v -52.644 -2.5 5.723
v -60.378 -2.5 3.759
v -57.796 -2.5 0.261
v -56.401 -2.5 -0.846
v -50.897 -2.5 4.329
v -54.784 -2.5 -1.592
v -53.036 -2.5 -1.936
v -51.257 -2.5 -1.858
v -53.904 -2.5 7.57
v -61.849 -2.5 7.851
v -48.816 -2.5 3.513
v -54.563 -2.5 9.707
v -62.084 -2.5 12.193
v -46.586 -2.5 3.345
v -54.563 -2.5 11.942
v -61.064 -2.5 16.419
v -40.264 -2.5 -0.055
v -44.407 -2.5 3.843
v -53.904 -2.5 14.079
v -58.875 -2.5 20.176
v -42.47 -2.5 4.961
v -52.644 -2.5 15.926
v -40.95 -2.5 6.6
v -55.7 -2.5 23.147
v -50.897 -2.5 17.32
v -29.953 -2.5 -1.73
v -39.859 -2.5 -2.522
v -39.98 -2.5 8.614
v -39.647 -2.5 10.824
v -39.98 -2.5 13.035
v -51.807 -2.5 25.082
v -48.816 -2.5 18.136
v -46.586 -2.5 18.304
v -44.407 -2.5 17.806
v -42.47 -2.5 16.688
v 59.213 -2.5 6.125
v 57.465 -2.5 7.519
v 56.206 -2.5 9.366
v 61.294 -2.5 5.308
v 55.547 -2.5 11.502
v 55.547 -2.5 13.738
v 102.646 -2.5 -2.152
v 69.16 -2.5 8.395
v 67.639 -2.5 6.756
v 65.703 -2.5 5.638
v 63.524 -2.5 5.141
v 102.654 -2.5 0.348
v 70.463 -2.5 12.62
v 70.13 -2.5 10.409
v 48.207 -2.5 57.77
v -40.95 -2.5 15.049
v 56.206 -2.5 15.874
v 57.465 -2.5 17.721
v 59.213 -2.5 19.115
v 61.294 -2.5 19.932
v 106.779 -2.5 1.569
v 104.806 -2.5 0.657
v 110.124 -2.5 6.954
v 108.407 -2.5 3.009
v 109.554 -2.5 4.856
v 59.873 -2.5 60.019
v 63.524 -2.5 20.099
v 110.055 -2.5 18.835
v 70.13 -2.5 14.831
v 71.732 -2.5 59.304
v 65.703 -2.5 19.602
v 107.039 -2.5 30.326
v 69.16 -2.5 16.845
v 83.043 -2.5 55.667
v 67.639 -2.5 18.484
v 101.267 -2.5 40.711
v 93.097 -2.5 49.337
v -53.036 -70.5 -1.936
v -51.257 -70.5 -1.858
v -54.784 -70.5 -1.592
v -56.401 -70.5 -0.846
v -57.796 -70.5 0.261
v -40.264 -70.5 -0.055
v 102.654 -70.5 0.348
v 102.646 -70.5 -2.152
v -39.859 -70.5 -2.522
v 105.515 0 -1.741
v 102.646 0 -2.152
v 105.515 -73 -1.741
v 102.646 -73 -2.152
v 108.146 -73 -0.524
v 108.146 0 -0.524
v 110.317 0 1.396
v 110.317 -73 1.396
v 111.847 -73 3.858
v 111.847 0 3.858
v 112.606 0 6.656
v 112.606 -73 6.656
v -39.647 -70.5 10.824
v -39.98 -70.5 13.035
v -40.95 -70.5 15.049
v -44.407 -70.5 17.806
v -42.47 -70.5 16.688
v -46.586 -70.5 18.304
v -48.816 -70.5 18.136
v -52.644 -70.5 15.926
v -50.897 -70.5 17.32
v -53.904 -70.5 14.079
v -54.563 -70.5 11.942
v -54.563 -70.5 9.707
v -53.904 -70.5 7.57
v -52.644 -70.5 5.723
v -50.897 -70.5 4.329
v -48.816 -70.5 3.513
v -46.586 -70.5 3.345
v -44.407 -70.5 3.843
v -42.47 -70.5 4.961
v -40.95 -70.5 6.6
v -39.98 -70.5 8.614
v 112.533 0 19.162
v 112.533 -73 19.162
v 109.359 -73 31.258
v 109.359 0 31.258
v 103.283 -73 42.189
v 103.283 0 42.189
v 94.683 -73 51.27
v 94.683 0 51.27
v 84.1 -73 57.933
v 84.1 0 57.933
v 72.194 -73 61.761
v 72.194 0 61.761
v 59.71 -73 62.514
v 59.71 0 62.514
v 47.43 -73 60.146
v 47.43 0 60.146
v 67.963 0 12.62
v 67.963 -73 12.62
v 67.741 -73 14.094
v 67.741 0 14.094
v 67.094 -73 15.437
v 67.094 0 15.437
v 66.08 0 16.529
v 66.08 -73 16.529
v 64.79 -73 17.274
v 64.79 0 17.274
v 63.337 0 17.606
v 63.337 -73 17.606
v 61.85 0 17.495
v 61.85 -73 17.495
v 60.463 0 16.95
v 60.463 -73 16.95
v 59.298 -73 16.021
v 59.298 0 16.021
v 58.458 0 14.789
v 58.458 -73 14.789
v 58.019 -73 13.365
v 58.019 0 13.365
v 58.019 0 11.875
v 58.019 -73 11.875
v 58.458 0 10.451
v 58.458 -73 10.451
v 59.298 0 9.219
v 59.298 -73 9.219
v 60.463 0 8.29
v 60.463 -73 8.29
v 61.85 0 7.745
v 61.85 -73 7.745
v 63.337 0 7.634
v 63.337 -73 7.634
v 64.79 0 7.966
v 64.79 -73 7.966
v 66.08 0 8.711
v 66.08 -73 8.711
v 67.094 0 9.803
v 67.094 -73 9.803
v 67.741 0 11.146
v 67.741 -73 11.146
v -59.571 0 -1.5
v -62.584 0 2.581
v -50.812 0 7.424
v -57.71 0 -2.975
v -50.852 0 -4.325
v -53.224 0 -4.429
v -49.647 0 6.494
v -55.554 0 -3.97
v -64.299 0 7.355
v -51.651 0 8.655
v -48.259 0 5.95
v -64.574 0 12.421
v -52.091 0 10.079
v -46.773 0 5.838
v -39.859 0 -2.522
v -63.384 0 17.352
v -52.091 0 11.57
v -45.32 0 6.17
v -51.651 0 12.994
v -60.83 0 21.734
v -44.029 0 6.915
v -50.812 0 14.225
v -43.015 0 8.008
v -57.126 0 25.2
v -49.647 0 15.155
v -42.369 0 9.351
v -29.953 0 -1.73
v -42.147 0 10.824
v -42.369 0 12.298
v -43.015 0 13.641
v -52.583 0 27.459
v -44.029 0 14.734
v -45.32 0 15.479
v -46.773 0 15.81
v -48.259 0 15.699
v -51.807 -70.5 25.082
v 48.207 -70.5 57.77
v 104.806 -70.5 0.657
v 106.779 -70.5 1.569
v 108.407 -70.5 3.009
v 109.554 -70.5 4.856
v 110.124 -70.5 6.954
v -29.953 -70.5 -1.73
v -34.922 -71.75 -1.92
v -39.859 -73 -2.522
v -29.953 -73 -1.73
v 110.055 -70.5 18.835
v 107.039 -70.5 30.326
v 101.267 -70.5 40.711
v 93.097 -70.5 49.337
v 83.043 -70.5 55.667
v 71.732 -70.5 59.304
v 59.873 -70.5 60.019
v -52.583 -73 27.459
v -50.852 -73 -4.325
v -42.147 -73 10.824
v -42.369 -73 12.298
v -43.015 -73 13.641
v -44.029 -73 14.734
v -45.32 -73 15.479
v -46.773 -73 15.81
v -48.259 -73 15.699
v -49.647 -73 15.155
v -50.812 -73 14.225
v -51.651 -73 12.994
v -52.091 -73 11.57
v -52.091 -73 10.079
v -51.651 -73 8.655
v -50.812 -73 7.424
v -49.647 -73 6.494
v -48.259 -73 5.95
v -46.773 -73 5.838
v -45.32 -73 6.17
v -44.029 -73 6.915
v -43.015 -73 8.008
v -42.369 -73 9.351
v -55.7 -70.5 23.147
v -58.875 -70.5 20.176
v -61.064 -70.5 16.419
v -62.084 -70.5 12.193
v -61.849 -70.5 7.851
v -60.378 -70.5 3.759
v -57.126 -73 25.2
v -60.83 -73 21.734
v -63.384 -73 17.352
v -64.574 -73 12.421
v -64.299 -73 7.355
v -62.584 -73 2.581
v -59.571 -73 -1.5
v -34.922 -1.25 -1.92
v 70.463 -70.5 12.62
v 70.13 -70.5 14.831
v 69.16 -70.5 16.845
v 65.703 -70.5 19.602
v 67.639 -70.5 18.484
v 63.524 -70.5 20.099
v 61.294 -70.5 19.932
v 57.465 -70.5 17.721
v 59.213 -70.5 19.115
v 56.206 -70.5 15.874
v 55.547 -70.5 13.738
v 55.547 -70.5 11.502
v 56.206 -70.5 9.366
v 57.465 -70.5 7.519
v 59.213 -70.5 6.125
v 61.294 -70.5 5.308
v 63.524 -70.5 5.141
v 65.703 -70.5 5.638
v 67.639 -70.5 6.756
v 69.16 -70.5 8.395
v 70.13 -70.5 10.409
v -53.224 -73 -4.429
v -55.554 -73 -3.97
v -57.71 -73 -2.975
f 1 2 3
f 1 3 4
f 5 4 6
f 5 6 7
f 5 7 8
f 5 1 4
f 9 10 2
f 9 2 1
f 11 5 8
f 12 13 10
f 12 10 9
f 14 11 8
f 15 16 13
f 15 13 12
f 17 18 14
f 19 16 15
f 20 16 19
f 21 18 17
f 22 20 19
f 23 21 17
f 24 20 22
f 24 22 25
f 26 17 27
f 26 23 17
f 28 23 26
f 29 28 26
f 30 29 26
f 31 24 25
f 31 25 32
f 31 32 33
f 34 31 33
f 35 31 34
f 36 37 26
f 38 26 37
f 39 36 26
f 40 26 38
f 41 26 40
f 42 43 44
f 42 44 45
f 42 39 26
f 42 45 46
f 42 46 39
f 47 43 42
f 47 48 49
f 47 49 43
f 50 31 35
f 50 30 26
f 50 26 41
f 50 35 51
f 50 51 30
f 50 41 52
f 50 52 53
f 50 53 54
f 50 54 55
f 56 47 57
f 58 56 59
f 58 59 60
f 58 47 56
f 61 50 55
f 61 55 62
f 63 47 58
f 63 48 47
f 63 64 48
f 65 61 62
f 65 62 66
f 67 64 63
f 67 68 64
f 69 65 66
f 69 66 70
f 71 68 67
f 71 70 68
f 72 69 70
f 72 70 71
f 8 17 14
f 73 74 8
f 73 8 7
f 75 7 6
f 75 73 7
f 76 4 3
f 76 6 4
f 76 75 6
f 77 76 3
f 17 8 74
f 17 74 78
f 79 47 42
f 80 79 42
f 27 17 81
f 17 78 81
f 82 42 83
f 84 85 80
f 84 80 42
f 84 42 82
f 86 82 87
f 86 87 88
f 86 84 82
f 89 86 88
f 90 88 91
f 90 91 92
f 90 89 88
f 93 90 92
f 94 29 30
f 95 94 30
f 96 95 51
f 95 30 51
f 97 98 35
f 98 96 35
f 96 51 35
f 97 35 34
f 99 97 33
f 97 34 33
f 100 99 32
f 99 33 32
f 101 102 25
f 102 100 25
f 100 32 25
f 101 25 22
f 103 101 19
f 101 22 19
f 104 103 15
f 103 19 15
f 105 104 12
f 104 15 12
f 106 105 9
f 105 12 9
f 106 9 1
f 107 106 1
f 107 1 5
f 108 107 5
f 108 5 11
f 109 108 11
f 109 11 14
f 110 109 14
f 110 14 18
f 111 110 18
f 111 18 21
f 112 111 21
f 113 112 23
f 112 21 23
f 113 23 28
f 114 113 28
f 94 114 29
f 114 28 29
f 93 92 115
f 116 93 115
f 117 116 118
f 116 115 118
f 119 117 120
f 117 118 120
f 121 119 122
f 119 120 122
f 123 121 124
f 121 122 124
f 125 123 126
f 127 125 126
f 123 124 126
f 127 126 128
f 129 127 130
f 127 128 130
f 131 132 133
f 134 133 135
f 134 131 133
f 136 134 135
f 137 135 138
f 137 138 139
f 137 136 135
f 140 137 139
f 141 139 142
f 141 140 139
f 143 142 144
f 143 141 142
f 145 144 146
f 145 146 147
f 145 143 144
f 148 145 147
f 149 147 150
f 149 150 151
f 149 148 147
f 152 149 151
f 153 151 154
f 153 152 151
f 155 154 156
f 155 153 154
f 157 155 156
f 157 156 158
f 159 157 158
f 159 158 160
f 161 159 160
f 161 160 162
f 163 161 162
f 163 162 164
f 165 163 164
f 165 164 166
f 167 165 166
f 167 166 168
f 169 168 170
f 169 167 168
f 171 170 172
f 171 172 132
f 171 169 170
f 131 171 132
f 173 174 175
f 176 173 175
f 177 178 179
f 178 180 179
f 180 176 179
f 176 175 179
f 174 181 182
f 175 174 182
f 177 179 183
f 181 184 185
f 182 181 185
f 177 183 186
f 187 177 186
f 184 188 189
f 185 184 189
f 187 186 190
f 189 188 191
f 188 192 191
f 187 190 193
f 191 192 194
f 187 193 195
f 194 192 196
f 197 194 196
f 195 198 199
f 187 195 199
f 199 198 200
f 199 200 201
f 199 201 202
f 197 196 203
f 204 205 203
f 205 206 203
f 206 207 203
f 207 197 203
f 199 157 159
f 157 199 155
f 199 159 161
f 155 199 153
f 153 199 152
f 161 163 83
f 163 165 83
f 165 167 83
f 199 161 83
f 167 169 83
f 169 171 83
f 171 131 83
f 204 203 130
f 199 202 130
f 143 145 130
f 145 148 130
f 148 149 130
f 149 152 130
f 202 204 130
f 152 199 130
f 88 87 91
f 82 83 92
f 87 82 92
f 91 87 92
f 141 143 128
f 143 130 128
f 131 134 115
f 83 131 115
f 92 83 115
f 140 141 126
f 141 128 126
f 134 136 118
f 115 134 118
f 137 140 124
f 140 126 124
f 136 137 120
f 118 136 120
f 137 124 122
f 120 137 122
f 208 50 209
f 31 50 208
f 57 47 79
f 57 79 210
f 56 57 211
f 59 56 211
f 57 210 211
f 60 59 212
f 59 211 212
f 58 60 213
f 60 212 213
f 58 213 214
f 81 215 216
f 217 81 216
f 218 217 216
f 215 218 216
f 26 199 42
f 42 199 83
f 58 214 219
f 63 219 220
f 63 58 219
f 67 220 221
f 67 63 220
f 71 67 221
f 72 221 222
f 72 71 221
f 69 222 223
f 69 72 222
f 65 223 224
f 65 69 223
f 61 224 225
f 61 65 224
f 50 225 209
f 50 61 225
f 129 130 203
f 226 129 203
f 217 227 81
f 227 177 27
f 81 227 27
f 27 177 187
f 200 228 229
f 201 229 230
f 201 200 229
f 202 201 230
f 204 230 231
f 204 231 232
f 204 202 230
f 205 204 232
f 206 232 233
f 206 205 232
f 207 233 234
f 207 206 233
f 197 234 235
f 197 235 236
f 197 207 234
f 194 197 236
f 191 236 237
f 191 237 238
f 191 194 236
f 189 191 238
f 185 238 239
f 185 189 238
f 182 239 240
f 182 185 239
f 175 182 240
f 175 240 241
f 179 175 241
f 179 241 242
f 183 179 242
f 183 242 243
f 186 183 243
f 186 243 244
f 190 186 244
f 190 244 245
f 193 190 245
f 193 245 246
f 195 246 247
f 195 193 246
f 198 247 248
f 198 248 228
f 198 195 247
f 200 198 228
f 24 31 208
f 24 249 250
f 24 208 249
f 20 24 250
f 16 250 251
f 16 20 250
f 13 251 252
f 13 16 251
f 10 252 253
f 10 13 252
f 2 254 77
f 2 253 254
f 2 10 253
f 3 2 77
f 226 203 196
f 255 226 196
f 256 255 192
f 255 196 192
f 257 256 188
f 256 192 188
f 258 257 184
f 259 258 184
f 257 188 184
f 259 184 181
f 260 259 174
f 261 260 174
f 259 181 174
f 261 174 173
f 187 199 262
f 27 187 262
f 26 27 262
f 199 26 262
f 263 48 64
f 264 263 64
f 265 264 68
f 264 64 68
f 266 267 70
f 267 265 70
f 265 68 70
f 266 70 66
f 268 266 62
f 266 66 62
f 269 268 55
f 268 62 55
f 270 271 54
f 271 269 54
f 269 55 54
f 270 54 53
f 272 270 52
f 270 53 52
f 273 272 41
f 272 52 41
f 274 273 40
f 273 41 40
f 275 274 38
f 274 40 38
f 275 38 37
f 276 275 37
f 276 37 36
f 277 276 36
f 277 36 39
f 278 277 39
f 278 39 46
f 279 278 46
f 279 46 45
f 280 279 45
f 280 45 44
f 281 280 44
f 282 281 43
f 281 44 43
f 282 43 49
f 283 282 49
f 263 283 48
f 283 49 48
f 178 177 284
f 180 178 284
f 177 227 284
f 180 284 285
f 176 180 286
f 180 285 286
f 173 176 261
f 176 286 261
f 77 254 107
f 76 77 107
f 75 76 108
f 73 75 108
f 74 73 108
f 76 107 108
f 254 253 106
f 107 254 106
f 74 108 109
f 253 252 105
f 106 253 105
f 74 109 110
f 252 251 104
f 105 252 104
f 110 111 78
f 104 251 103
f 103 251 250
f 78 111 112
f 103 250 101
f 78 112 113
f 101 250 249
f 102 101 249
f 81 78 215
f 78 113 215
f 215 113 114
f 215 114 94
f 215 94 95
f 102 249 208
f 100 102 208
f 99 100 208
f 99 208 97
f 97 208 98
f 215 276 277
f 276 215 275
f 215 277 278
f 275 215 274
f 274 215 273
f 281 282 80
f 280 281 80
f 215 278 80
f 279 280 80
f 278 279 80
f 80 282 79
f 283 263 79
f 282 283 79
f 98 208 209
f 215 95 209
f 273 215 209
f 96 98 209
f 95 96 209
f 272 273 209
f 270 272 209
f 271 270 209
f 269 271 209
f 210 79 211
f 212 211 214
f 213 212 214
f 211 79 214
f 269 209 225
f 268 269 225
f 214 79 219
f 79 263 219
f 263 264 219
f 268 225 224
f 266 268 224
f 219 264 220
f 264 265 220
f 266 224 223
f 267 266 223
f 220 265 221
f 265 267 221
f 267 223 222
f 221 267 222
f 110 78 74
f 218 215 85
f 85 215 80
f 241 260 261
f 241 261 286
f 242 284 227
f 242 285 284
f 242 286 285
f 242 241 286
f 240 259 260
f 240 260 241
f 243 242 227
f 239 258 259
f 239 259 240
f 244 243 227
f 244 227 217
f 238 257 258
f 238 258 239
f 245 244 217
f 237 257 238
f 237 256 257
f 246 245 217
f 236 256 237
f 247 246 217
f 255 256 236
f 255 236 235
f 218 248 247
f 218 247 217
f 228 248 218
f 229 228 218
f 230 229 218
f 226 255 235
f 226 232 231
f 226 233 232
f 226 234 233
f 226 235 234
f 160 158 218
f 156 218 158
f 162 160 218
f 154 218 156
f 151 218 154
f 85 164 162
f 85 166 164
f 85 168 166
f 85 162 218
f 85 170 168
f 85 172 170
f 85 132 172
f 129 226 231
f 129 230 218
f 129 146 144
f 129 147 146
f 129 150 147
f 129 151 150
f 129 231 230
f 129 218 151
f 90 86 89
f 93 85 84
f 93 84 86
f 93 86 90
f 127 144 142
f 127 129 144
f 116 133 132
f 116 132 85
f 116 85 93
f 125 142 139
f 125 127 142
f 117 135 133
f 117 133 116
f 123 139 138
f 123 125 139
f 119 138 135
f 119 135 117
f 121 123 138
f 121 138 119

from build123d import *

# Parameters (mm, degrees)
F0_R        = 5
F1_DEPTH    = 73
F2_T1_DEPTH = 73
F3_R        = 10
F4_T        = 2.5


# Not quite as in the source:
# - a fillet or chamfer that OpenCascade refuses, or shapes differently, is made with other operations: its cross-section is extruded or revolved along the edge and cut away or added
# - a shell that OpenCascade refuses in one call is made with other operations: the cavity is built on its own and cut out


with BuildPart() as f1:
    # F0 (on Front) → F1 (new body)
    with BuildSketch(Plane.XZ):
        with BuildLine():
            Line((105.4664104798, -2.1604888337), (110.723299262, -2.1771916507))
            ThreePointArc((110.723299262, -2.1771916507), (98.0443002081, 48.2472921113), (47.4300209604, 60.1460448152))
            Line((47.4300209604, 60.1460448152), (-52.5831548864, 27.4585928761))
            ThreePointArc((-52.5831548864, 27.4585928761), (-64.6091493054, 11.9687796957), (-54.7073812284, -4.9579401011))
            Line((-54.7073812284, -4.9579401011), (-34.93893119, -1.7143761565))
            Line((-34.93893119, -1.7143761565), (20.3665836392, -1.8900994658))
            ThreePointArc((20.3665836392, -1.8900994658), (55.6091219512, 57.015037844), (107.9630298197, 12.6199926356))
            ThreePointArc((107.9630298197, 12.6199926356), (107.3344853384, 5.1250653412), (105.4664104798, -2.1604888337))
        make_face()
        with Locations((-47.1466017857, 10.8244746133)):
            Circle(F0_R, mode=Mode.SUBTRACT)
        with BuildLine():
            Line((20.3665836392, -1.8900994658), (105.4664104798, -2.1604888337))
            ThreePointArc((105.4664104798, -2.1604888337), (107.3344853384, 5.1250653412), (107.9630298197, 12.6199926356))
            ThreePointArc((107.9630298197, 12.6199926356), (55.6091219512, 57.015037844), (20.3665836392, -1.8900994658))
        make_face()
        with Locations((62.9630298197, 12.6199926356)):
            Circle(F0_R, mode=Mode.SUBTRACT)
    extrude(amount=F1_DEPTH)

    # F2: fillet of radius 60 on 1 edges, made by hand

    # F2_s2 → F2_t1 (join)
    with BuildSketch(Plane.XZ):
        with BuildLine():
            add(Edge.make_bspline(
                [(-39.8587548674, -2.52161004), (-34.93893119, -1.7143761565), (-29.9533479112, -1.7302169492)],
                knots=[0, 0, 0, 1, 1, 1], degree=2, weights=[1, 1, 1]))
            Line((-29.9533479112, -1.7302169492), (-34.93893119, -1.7143761565))
            Line((-34.93893119, -1.7143761565), (-39.8587548674, -2.52161004))
        make_face()
    extrude(amount=F2_T1_DEPTH)

    # F3
    f3_edges = [f1.edges().sort_by_distance(p)[0] for p in [
        (110.723299, -36.5, -2.177192),
        (-54.707381, -36.5, -4.95794),
    ]]
    fillet(f3_edges, radius=F3_R)

    # F4: shell of thickness 2.5, made by hand


with BuildPart() as f4_core1:
    # F4_t2: copy of F1
    add(f1.part)

    # the walls: a layer under each face that stays
    f4_faces = [f4_core1.faces().sort_by_distance(p)[0] for p in [
        (94.683390136, -36.5, 51.2699440121),
        (24.158214017, 0, 29.0813282585),
        (109.3014464934, -36.5, 0.3569505301),
        (-2.576566963, -36.5, 43.8023188457),
        (24.158214017, -73, 29.0813282585),
        (-64.1583335829, -36.5, 14.9294692855),
        (-55.554318165, -36.5, -3.9702240205),
        (-45.3554663929, -36.5, -3.4234984168),
        (-52.1466017857, -36.5, 10.8244746133),
        (57.9630298197, -36.5, 12.6199926356),
    ]]
    thicken(f4_faces, amount=-F4_T, mode=Mode.SUBTRACT)


with BuildPart() as f1_1:
    add(f1.part)

    # what is left inside the walls is the cavity
    f4_cavity = [f4_core1.part.solids().sort_by_distance(p)[0] for p in [
        (36.346225, -47.833333, -1.915872),
    ]]
    add(f4_cavity, mode=Mode.SUBTRACT)


solid = f1_1.part
